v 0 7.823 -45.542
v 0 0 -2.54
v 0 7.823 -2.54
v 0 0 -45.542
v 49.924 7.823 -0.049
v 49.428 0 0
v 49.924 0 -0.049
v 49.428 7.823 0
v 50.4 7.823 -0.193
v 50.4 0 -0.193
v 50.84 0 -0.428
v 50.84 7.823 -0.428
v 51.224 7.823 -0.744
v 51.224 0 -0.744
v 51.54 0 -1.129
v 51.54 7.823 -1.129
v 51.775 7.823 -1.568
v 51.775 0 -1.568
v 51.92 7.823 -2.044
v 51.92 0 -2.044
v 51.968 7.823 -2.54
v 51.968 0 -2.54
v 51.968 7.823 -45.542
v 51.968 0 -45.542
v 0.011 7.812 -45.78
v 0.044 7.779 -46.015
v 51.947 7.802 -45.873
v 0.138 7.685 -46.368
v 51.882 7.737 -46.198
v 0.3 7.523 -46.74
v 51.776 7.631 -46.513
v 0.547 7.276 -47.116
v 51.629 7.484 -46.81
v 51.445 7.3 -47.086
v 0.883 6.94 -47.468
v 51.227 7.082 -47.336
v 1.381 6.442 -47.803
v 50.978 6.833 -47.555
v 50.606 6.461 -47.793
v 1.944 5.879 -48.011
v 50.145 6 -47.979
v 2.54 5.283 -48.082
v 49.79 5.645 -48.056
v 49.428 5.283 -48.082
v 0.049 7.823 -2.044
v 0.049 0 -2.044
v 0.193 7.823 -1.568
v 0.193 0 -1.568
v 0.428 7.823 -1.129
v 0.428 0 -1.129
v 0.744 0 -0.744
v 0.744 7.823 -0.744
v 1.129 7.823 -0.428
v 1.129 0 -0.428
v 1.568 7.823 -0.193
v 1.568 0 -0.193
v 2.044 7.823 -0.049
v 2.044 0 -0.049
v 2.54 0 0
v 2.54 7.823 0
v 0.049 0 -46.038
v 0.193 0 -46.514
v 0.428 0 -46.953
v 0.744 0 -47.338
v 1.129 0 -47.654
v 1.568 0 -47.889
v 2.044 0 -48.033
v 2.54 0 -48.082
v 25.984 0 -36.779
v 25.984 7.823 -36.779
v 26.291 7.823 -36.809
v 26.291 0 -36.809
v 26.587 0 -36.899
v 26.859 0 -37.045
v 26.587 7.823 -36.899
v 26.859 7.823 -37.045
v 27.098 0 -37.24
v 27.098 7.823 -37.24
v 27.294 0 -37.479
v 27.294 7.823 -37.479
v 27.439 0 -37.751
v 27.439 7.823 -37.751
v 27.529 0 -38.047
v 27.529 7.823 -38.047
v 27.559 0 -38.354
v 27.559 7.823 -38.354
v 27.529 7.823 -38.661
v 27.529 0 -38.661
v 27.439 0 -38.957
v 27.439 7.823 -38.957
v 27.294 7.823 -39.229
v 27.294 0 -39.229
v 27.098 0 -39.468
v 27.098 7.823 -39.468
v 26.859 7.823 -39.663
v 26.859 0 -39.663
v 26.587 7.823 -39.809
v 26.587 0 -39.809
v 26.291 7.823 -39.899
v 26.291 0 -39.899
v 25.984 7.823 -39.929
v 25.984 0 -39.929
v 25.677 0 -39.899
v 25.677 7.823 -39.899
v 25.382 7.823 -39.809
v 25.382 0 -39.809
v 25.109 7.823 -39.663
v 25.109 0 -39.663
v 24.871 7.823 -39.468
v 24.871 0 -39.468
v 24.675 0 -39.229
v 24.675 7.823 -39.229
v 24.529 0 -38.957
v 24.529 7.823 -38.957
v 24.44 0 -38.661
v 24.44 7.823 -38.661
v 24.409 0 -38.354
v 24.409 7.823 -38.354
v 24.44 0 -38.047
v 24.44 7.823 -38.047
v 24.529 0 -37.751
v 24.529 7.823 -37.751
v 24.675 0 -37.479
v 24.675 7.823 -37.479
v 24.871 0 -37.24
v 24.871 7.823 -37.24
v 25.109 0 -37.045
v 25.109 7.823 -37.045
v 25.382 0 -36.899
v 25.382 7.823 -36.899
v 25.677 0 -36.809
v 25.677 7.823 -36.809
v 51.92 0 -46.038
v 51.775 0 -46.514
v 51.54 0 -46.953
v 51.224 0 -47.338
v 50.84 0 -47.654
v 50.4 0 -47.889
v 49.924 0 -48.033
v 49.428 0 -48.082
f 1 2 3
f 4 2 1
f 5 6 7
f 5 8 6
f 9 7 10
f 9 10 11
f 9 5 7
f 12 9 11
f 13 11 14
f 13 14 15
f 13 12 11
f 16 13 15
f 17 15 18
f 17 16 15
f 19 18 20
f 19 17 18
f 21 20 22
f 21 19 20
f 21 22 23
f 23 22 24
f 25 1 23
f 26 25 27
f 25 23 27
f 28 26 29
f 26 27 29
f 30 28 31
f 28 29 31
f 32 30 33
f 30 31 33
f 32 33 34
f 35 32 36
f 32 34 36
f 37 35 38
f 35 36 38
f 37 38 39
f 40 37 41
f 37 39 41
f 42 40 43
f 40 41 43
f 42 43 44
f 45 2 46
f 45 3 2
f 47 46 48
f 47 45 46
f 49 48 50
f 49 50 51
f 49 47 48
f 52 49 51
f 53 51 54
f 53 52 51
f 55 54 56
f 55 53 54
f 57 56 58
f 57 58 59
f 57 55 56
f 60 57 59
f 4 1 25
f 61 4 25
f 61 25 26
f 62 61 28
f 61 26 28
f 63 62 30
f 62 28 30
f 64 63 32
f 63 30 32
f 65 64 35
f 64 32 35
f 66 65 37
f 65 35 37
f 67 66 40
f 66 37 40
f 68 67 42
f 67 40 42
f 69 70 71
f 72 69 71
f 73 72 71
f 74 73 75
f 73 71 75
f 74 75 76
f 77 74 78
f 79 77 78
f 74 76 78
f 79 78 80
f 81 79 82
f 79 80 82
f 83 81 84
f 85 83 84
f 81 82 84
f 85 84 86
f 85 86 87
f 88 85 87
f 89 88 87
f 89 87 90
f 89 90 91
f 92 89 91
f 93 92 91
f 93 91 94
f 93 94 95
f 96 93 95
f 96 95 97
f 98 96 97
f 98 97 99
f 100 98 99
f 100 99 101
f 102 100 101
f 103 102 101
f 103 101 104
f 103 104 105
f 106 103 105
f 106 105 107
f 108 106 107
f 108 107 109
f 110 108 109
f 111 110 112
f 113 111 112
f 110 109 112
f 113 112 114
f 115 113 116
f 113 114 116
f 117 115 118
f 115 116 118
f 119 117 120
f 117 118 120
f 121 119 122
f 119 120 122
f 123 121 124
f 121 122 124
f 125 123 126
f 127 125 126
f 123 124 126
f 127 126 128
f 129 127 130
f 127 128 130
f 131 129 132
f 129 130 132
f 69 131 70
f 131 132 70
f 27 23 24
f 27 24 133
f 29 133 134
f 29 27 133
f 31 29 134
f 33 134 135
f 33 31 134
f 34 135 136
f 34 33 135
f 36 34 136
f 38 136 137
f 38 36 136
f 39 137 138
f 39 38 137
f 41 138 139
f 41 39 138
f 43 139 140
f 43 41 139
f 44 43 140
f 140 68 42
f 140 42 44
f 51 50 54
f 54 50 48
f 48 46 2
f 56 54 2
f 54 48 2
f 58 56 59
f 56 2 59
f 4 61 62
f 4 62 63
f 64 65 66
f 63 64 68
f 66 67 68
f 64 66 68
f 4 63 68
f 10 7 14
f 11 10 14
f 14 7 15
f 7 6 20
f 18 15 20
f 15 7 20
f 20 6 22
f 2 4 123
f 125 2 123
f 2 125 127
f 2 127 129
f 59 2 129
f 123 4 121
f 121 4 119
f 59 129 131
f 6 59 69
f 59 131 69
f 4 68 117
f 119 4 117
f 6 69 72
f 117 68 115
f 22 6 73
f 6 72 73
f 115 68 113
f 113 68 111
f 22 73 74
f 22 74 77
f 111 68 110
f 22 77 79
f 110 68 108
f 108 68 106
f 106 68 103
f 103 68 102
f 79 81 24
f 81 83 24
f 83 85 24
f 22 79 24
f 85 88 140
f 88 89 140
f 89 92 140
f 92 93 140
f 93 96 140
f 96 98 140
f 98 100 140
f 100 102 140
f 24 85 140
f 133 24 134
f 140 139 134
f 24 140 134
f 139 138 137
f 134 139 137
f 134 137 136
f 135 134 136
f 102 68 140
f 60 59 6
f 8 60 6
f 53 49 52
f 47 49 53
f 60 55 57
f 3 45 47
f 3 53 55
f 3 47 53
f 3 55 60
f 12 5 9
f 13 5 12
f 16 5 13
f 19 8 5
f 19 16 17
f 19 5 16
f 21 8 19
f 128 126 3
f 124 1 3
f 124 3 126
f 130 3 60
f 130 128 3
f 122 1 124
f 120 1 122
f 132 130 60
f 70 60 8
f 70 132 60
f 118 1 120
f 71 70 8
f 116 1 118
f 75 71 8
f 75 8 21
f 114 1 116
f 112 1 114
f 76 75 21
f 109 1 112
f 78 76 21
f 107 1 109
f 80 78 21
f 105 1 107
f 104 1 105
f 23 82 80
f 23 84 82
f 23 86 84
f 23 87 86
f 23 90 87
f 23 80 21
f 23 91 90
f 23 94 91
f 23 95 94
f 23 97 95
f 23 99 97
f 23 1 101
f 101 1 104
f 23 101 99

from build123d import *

# Parameters (mm, degrees)
SKETCH1_W           = 51.9684
SKETCH1_H           = 48.0822
BOSS_EXTRUDE1_DEPTH = 7.8232
FILLET1_R           = 2.54
FILLET2_R           = 2.54
SKETCH3_R           = 1.5748
CUT_EXTRUDE1_DEPTH  = 72.230716785


with BuildPart() as part:
    # Sketch1 → Boss-Extrude1 (new body)
    with BuildSketch(Plane(origin=(0, 0, 0), x_dir=(1, 0, 0), z_dir=(0, 1, 0))):
        with Locations((25.9842, 24.0411)):
            Rectangle(SKETCH1_W, SKETCH1_H)
    extrude(amount=BOSS_EXTRUDE1_DEPTH)

    # Fillet1
    fillet1_edges = [part.edges().sort_by_distance(p)[0] for p in [
        (0, 3.9116, -48.0822),
        (51.9684, 3.9116, -48.0822),
        (51.9684, 3.9116, 0),
        (0, 3.9116, 0),
    ]]
    fillet(fillet1_edges, radius=FILLET1_R)

    # Fillet2
    # the kernel refuses this fillet: 2.54 mm, written as the material it takes off along each edge
    with BuildSketch(Plane(origin=(55.7784, 7.8232, -48.0822), x_dir=(0, 0, 1), z_dir=(-1, 0, 0))) as fillet2_piece_1:
        with BuildLine():
            CenterArc((FILLET2_R, -FILLET2_R), FILLET2_R, 90, 90)
            Line((0, -FILLET2_R), (0, 0))
            Line((0, 0), (FILLET2_R, 0))
        make_face()
    extrude(amount=59.5884, mode=Mode.SUBTRACT)

    # Sketch3 → Cut-Extrude1 (cut, through all)
    with BuildSketch(Plane(origin=(0, 7.8232, 0), x_dir=(1, 0, 0), z_dir=(0, 1, 0))):
        with Locations(Location((25.9842, 38.354, 0), (0, 0, 270))):
            Circle(SKETCH3_R)
    extrude(amount=-CUT_EXTRUDE1_DEPTH, mode=Mode.SUBTRACT)


solid = part.part
